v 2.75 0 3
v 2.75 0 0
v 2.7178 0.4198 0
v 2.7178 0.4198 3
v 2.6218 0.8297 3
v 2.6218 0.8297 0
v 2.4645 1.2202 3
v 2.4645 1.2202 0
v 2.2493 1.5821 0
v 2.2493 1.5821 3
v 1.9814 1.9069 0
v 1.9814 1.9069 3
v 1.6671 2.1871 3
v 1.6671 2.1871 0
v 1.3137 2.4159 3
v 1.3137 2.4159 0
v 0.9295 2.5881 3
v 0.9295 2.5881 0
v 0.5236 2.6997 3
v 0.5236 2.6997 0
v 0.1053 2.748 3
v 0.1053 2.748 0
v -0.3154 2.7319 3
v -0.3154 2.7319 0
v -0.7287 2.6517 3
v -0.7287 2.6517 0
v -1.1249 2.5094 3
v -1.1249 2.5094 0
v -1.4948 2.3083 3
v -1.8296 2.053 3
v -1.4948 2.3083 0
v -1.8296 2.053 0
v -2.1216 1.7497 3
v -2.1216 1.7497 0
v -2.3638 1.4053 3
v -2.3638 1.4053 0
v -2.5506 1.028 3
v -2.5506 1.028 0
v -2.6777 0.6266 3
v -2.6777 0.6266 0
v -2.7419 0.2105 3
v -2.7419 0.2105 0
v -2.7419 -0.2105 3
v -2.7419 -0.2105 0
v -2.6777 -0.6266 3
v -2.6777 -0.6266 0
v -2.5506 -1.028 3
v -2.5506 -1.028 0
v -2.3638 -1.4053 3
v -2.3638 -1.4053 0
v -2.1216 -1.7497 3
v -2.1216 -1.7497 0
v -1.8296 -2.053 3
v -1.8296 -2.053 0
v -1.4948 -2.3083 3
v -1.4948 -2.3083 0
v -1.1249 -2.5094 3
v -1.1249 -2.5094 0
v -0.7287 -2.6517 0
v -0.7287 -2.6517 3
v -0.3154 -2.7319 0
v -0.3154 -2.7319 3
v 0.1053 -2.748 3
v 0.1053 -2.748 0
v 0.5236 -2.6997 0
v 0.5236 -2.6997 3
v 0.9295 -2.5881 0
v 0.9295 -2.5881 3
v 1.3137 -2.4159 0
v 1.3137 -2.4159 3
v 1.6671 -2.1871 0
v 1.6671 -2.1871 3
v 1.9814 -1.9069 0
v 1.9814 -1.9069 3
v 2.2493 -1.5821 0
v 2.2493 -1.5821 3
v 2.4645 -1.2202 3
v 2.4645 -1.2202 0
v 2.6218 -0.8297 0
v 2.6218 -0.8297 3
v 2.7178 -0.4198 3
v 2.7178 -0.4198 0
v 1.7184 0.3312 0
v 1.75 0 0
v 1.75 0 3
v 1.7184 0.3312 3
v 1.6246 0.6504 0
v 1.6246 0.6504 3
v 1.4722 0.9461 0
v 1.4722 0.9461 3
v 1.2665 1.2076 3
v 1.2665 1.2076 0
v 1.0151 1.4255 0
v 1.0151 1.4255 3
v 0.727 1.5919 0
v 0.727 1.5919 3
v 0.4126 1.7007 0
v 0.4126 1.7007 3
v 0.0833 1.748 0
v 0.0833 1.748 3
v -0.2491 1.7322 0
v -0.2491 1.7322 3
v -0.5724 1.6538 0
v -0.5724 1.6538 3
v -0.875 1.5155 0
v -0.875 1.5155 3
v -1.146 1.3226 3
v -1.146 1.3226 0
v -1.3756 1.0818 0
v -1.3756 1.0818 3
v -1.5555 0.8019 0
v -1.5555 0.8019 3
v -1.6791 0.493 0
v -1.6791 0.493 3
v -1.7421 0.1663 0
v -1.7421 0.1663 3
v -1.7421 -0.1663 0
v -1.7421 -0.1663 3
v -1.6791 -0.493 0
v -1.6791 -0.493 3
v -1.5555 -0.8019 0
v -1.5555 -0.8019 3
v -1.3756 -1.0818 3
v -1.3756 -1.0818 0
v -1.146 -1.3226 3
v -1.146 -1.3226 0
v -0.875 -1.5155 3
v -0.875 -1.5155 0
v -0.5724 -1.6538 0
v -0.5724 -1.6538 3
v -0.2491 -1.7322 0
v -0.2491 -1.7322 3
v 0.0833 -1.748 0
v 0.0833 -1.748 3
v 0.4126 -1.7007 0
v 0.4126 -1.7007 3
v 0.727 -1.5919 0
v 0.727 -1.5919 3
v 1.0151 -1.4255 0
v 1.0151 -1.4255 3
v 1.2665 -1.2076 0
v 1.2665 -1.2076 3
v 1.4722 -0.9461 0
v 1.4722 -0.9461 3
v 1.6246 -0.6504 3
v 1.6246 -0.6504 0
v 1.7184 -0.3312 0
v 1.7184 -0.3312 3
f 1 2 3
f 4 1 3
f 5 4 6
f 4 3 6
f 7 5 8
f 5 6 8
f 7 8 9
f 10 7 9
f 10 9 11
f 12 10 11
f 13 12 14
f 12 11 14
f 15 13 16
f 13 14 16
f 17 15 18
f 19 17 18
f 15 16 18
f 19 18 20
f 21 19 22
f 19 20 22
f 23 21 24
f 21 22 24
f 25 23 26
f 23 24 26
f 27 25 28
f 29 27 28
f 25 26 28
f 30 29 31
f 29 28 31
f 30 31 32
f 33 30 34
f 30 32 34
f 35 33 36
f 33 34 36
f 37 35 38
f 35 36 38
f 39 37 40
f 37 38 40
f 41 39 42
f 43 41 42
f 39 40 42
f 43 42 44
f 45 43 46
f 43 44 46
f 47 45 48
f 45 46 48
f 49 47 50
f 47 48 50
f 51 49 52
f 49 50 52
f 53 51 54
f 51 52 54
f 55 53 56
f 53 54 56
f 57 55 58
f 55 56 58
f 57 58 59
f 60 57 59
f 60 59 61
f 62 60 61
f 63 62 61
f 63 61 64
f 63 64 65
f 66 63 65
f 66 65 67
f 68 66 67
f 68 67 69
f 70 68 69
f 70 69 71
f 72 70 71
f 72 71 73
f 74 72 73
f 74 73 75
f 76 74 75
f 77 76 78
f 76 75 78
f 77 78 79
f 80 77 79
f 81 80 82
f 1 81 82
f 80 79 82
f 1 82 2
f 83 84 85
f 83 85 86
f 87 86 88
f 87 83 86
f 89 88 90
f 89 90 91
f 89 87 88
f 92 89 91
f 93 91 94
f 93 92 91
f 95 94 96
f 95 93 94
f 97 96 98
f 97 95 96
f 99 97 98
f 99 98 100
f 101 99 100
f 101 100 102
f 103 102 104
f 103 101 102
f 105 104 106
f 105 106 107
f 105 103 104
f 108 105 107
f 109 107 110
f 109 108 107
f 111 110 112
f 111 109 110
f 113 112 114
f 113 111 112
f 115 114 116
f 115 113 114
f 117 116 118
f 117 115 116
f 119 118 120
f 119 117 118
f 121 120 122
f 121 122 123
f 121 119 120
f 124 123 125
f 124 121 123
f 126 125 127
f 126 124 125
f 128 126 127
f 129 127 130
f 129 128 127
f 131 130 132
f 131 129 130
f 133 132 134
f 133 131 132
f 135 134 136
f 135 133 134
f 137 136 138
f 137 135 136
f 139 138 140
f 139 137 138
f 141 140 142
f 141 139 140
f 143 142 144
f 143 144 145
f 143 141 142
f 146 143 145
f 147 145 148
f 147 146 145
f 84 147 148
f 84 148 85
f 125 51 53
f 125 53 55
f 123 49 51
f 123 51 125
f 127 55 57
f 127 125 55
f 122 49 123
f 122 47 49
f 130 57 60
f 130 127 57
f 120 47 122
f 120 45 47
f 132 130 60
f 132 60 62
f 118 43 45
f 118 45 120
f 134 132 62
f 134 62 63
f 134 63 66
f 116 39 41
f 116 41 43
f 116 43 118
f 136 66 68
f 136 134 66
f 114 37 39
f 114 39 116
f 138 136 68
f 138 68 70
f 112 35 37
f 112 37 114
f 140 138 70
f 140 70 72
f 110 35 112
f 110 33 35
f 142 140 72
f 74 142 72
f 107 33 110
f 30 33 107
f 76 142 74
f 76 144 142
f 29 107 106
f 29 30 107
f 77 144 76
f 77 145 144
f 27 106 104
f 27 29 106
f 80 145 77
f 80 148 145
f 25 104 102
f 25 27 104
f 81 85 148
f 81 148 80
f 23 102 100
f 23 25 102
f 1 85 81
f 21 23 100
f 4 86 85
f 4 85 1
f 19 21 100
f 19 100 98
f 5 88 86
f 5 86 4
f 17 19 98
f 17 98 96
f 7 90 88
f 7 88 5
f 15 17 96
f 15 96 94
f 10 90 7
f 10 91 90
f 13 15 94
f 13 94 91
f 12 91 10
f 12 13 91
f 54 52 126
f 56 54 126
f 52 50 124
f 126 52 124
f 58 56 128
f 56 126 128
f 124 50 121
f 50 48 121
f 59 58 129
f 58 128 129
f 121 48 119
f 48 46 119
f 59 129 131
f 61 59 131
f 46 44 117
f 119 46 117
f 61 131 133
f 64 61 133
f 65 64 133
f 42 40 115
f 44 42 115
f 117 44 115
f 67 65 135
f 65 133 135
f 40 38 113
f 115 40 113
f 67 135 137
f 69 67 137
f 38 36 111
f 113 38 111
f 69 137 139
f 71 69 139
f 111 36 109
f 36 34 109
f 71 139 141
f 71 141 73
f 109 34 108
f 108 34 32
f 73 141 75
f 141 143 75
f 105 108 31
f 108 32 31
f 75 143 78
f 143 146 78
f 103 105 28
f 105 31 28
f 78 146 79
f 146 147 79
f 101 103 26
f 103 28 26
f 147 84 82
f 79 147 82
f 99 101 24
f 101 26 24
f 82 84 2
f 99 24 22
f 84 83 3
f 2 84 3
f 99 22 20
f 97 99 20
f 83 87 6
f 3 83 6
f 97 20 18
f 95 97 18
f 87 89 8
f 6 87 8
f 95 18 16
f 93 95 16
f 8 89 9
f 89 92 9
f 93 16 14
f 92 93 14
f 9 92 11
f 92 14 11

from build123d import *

# Parameters (mm, degrees)
CYLINDER001_R     = 1.75
CYLINDER001_DEPTH = 3
CYLINDER_R        = 2.75
CYLINDER_DEPTH    = 3


with BuildPart() as interior:
    # Cylinder001 → Cylinder001 (new body)
    with BuildSketch(Plane.XY):
        Circle(CYLINDER001_R)
    extrude(amount=CYLINDER001_DEPTH)


with BuildPart() as spacer:
    # Cylinder → Cylinder (new body)
    with BuildSketch(Plane.XY):
        Circle(CYLINDER_R)
    extrude(amount=CYLINDER_DEPTH)

    # Cut: cut interior
    add(interior.part, mode=Mode.SUBTRACT)


solid = spacer.part
